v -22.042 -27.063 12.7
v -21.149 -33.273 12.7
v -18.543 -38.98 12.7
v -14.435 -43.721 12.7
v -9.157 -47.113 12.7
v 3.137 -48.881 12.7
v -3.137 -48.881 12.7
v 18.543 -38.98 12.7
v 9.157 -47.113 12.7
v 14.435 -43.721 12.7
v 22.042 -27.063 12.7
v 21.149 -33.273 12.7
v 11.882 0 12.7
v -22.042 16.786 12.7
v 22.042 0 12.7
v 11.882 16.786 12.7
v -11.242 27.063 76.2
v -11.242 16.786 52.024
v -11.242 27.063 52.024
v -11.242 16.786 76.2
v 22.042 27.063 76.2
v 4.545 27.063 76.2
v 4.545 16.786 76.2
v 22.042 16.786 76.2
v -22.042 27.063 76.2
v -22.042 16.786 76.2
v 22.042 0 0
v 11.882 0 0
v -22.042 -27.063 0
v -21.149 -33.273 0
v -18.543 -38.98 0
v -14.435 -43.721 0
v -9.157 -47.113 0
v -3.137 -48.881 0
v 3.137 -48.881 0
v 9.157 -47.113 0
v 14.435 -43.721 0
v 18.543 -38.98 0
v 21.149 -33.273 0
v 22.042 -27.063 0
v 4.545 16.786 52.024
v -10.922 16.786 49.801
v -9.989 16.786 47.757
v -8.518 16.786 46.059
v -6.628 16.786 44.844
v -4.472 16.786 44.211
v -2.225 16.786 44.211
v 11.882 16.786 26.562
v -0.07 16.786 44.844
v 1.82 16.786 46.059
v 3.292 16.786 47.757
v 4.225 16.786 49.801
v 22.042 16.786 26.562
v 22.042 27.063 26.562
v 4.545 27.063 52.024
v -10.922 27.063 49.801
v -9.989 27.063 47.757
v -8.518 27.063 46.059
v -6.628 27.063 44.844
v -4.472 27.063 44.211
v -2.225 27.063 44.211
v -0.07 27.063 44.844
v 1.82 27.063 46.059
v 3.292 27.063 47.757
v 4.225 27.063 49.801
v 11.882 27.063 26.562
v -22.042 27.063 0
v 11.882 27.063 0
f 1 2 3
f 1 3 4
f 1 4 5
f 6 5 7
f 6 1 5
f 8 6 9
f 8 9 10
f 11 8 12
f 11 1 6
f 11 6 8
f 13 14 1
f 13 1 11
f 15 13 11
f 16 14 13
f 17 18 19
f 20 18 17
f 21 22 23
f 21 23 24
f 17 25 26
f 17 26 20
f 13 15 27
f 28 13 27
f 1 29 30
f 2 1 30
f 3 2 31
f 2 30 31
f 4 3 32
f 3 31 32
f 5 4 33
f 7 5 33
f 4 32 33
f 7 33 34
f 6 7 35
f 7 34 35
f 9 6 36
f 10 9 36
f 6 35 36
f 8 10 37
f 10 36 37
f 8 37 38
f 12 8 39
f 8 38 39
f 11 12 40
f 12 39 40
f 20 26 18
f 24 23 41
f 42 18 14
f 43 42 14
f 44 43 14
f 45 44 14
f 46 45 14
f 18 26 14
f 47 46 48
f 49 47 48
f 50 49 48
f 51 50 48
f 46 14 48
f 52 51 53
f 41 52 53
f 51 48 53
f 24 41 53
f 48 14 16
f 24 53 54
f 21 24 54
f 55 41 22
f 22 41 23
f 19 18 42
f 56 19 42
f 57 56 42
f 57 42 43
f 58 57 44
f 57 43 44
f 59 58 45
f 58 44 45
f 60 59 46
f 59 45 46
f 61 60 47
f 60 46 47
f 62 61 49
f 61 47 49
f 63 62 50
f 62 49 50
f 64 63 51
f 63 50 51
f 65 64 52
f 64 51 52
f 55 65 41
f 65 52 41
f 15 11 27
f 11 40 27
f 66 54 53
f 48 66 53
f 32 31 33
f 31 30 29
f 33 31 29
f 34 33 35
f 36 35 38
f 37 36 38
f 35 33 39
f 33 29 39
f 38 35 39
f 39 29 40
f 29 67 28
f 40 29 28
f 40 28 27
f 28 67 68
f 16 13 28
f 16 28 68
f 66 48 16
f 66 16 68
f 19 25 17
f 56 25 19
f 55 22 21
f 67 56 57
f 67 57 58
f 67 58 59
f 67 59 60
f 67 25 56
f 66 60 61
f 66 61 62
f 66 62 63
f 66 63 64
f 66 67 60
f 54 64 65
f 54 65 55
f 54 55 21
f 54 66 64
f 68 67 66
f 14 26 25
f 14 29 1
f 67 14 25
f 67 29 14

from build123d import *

# Parameters (mm, degrees)
F0_W     = 44.0846085548
F0_H     = 54.1256517172
F1_DEPTH = 12.7
F2_W     = 44.0846085548
F2_H     = 10.2772433311
F3_DEPTH = 63.5
F5_DEPTH = 10.16
F6_W     = 15.7867255621
F6_H     = 24.1755610228
F7_DEPTH = 10.2782433311


with BuildPart() as f1:
    # F0 (on Top) → F1 (new body)
    with BuildSketch(Plane.XY):
        with BuildLine():
            ThreePointArc((-22.0423042774, -27.0628258586), (0, -49.105130136), (22.0423042774, -27.0628258586))
            Line((22.0423042774, -27.0628258586), (-22.0423042774, -27.0628258586))
        make_face()
        Rectangle(F0_W, F0_H)
    extrude(amount=F1_DEPTH)

    # F2 (on face) → F3 (join)
    with BuildSketch(Plane.XY.offset(12.7)):
        with Locations((0, 21.9242041931)):
            Rectangle(F2_W, F2_H)
    extrude(amount=F3_DEPTH)

    # F4 (on face) → F5 (cut)
    with BuildSketch(Plane.YZ.offset(22.0423042774)):
        Polygon((16.7855825275, 12.7), (0, 12.7), (0, 0), (27.0628258586, 0), (27.0628258586, 26.5619661659), (16.7855825275, 26.5619661659), align=None)
    extrude(amount=-F5_DEPTH, mode=Mode.SUBTRACT)

    # F6 (on face) → F7 (cut, through all)
    with BuildSketch(Plane.XZ.offset(-16.7855825275)):
        with BuildLine():
            Line((4.5446627773, 52.0244389772), (-11.2420627847, 52.0244389772))
            ThreePointArc((-11.2420627847, 52.0244389772), (-3.3487000037, 44.1310761962), (4.5446627773, 52.0244389772))
        make_face()
        with Locations((-3.3487000037, 64.1122194886)):
            Rectangle(F6_W, F6_H)
    extrude(amount=-F7_DEPTH, mode=Mode.SUBTRACT)


solid = f1.part
